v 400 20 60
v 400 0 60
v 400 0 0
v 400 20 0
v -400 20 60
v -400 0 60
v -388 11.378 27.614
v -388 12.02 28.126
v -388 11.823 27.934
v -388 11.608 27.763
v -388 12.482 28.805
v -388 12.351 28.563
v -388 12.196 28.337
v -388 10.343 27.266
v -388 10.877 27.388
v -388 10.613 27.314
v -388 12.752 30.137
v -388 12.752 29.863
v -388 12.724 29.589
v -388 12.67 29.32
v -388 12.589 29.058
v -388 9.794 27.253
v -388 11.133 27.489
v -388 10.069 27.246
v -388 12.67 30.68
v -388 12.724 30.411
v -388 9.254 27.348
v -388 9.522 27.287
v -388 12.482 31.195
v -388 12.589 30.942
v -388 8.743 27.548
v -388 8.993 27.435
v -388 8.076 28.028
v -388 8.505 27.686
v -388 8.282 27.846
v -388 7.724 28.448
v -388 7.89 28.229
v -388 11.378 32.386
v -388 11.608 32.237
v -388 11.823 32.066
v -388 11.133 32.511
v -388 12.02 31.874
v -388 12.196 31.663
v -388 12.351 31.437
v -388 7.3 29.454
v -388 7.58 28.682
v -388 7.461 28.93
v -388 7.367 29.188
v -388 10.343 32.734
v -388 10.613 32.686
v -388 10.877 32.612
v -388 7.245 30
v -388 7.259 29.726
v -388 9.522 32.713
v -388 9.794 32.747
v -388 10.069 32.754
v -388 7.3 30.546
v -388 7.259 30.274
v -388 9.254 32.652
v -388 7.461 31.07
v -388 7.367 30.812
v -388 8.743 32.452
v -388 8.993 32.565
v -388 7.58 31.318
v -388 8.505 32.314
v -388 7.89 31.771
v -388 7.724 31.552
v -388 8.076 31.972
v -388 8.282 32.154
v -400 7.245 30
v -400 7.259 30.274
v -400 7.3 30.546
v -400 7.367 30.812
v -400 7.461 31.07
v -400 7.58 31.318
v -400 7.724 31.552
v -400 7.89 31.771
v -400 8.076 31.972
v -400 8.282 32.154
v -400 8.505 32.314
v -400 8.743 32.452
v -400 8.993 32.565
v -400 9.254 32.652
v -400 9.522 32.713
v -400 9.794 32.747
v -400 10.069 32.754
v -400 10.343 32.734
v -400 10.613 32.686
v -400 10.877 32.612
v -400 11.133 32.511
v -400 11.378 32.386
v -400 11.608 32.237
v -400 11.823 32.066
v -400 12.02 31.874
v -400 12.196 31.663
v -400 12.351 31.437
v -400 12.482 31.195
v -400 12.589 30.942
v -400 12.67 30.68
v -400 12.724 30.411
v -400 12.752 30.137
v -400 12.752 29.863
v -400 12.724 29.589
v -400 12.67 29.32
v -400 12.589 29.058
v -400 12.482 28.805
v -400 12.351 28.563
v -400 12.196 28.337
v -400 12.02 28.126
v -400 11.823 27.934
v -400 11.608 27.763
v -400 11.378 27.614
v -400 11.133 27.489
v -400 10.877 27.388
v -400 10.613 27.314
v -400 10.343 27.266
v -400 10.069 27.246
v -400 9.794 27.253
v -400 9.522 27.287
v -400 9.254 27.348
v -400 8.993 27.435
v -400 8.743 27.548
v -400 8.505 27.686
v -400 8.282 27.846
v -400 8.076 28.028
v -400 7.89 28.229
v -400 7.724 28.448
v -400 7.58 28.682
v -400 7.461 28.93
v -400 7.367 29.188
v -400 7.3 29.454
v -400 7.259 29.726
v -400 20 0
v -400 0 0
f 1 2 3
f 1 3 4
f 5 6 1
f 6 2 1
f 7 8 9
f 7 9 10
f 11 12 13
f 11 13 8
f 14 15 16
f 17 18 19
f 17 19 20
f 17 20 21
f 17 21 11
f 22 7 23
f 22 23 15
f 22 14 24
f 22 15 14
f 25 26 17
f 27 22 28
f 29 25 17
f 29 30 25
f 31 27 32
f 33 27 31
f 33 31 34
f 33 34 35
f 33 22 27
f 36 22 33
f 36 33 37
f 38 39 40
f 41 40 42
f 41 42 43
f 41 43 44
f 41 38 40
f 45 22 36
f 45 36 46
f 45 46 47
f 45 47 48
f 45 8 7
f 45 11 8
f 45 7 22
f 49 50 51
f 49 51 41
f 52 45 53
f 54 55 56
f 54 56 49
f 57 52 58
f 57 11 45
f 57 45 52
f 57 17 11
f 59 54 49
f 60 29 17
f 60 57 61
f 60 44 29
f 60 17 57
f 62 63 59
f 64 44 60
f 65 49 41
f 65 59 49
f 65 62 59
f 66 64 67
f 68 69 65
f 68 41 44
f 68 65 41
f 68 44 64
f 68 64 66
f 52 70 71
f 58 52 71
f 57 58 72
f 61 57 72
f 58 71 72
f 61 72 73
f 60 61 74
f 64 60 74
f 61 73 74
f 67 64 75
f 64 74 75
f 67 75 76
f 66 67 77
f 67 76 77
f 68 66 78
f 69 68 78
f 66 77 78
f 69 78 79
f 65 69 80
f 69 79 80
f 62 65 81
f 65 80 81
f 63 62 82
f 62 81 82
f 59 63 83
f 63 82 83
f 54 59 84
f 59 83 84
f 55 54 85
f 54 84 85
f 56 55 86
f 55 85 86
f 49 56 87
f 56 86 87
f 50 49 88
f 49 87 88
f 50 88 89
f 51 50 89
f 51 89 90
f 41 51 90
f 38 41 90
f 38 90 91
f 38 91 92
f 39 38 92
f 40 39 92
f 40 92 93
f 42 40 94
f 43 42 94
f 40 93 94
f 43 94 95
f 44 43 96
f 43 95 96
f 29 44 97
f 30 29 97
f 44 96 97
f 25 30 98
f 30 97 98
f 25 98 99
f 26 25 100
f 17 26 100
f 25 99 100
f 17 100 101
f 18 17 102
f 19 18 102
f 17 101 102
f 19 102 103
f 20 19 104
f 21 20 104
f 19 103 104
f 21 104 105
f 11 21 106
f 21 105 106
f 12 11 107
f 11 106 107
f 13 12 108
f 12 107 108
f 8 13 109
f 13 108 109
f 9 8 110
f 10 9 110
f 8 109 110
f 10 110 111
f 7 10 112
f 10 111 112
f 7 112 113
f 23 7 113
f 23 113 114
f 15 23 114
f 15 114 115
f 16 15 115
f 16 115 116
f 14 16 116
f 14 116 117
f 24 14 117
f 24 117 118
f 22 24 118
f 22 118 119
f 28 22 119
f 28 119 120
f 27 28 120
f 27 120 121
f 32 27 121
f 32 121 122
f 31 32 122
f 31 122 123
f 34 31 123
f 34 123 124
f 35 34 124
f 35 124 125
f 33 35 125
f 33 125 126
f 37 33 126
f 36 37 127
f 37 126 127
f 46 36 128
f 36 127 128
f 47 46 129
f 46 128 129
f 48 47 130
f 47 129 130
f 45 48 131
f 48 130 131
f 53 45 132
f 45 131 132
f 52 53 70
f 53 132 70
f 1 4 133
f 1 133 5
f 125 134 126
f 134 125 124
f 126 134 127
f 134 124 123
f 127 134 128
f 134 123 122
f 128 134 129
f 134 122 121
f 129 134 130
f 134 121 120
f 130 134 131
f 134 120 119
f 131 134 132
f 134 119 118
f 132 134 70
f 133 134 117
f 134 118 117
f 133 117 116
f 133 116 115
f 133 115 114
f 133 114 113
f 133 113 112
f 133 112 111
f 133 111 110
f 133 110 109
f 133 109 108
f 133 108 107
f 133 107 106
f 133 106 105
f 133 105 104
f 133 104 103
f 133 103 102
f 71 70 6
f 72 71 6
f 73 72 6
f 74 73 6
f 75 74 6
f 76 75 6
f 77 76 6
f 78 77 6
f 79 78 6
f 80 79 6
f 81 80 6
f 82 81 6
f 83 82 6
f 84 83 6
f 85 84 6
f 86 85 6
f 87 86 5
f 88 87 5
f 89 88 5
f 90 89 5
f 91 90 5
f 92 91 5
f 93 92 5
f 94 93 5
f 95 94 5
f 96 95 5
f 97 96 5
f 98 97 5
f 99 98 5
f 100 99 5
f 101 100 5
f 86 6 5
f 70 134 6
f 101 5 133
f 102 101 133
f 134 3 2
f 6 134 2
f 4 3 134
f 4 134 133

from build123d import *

# Parameters (mm, degrees)
F0_W     = 20
F0_H     = 60
F1_DEPTH = 400
F2_R     = 2.7550181626
F3_DEPTH = 12


with BuildPart() as f1:
    # F0 (on Right) → F1 (new body, symmetric)
    with BuildSketch(Plane.YZ):
        with Locations((10, 30)):
            Rectangle(F0_W, F0_H)
    extrude(amount=F1_DEPTH, both=True)

    # F2 (on face) → F3 (cut)
    with BuildSketch(Plane(origin=(-400, 0, 0), x_dir=(0, -1, 0), z_dir=(-1, 0, 0))):
        with Locations((-10, 30)):
            Circle(F2_R)
    extrude(amount=-F3_DEPTH, mode=Mode.SUBTRACT)


solid = f1.part
